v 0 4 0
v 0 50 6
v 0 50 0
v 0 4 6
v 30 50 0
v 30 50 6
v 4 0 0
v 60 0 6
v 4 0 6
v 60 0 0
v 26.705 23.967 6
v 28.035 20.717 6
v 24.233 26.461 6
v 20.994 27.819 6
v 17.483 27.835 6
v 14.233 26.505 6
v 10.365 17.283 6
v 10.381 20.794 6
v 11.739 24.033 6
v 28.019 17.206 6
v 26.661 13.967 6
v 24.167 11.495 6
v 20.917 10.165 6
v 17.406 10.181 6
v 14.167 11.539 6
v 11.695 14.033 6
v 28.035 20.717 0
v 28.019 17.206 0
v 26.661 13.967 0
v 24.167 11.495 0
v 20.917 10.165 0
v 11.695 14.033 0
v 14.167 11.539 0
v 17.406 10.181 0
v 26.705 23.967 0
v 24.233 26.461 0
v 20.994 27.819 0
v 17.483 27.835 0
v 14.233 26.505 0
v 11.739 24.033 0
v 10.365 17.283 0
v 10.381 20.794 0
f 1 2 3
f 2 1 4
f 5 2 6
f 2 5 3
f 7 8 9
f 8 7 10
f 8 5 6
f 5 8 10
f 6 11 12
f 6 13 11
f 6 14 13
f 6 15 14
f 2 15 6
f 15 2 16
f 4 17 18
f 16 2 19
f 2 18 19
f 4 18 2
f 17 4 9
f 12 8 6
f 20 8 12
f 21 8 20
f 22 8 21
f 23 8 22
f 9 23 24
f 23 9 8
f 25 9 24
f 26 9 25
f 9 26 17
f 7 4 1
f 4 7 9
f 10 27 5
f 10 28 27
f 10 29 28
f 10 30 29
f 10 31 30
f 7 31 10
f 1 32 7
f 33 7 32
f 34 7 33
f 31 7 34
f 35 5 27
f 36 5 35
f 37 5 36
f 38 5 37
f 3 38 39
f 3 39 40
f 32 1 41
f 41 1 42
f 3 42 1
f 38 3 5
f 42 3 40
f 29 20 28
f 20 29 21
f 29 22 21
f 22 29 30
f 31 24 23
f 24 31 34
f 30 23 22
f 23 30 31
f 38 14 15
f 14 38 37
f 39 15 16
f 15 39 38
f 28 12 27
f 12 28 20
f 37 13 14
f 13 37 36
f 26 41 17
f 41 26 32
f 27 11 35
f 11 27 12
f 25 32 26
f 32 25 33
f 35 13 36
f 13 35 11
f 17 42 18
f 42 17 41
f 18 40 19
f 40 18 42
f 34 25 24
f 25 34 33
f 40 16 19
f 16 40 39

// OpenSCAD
$fn = 32;

// ----------------------------------------------------------------------
// Bracket plate: gusset 60 x 50
// ----------------------------------------------------------------------

// --- parameters (mm) ---
hole_r = 3;               // bolt hole radius
plate_t = 6;              // plate thickness, Z (extrusion height)
gus_a = 60;               // base length
gus_b = 50;               // height
top_x = 30;               // top edge X of the angled cut
light_r = 9;              // lightening hole radius
fit_tol = 0.05;           // declared fit tolerance (prompt contract)
free_tol = 0.2;           // declared free tolerance (prompt contract)

light_d = 2 * light_r;

profile = [[4, 0], [30, 0], [60, 0], [30, 50], [0, 50], [0, 4]];  // primary outline, 6 points, counter clockwise
void_1 = [[28.035, 20.717], [26.705, 23.967], [24.233, 26.461], [20.994, 27.819], [17.483, 27.835], [14.233, 26.505], [11.739, 24.033], [10.381, 20.794], [10.365, 17.283], [11.695, 14.033], [14.167, 11.539], [17.406, 10.181], [20.917, 10.165], [24.167, 11.495], [26.661, 13.967], [28.019, 17.206]];  // lightening hole, 16 points

// --- the one profile operation ---
difference() {
  linear_extrude(height = plate_t) polygon(points = profile);
  translate([0, 0, -1])
    linear_extrude(height = plate_t + 2) polygon(points = void_1);
}
